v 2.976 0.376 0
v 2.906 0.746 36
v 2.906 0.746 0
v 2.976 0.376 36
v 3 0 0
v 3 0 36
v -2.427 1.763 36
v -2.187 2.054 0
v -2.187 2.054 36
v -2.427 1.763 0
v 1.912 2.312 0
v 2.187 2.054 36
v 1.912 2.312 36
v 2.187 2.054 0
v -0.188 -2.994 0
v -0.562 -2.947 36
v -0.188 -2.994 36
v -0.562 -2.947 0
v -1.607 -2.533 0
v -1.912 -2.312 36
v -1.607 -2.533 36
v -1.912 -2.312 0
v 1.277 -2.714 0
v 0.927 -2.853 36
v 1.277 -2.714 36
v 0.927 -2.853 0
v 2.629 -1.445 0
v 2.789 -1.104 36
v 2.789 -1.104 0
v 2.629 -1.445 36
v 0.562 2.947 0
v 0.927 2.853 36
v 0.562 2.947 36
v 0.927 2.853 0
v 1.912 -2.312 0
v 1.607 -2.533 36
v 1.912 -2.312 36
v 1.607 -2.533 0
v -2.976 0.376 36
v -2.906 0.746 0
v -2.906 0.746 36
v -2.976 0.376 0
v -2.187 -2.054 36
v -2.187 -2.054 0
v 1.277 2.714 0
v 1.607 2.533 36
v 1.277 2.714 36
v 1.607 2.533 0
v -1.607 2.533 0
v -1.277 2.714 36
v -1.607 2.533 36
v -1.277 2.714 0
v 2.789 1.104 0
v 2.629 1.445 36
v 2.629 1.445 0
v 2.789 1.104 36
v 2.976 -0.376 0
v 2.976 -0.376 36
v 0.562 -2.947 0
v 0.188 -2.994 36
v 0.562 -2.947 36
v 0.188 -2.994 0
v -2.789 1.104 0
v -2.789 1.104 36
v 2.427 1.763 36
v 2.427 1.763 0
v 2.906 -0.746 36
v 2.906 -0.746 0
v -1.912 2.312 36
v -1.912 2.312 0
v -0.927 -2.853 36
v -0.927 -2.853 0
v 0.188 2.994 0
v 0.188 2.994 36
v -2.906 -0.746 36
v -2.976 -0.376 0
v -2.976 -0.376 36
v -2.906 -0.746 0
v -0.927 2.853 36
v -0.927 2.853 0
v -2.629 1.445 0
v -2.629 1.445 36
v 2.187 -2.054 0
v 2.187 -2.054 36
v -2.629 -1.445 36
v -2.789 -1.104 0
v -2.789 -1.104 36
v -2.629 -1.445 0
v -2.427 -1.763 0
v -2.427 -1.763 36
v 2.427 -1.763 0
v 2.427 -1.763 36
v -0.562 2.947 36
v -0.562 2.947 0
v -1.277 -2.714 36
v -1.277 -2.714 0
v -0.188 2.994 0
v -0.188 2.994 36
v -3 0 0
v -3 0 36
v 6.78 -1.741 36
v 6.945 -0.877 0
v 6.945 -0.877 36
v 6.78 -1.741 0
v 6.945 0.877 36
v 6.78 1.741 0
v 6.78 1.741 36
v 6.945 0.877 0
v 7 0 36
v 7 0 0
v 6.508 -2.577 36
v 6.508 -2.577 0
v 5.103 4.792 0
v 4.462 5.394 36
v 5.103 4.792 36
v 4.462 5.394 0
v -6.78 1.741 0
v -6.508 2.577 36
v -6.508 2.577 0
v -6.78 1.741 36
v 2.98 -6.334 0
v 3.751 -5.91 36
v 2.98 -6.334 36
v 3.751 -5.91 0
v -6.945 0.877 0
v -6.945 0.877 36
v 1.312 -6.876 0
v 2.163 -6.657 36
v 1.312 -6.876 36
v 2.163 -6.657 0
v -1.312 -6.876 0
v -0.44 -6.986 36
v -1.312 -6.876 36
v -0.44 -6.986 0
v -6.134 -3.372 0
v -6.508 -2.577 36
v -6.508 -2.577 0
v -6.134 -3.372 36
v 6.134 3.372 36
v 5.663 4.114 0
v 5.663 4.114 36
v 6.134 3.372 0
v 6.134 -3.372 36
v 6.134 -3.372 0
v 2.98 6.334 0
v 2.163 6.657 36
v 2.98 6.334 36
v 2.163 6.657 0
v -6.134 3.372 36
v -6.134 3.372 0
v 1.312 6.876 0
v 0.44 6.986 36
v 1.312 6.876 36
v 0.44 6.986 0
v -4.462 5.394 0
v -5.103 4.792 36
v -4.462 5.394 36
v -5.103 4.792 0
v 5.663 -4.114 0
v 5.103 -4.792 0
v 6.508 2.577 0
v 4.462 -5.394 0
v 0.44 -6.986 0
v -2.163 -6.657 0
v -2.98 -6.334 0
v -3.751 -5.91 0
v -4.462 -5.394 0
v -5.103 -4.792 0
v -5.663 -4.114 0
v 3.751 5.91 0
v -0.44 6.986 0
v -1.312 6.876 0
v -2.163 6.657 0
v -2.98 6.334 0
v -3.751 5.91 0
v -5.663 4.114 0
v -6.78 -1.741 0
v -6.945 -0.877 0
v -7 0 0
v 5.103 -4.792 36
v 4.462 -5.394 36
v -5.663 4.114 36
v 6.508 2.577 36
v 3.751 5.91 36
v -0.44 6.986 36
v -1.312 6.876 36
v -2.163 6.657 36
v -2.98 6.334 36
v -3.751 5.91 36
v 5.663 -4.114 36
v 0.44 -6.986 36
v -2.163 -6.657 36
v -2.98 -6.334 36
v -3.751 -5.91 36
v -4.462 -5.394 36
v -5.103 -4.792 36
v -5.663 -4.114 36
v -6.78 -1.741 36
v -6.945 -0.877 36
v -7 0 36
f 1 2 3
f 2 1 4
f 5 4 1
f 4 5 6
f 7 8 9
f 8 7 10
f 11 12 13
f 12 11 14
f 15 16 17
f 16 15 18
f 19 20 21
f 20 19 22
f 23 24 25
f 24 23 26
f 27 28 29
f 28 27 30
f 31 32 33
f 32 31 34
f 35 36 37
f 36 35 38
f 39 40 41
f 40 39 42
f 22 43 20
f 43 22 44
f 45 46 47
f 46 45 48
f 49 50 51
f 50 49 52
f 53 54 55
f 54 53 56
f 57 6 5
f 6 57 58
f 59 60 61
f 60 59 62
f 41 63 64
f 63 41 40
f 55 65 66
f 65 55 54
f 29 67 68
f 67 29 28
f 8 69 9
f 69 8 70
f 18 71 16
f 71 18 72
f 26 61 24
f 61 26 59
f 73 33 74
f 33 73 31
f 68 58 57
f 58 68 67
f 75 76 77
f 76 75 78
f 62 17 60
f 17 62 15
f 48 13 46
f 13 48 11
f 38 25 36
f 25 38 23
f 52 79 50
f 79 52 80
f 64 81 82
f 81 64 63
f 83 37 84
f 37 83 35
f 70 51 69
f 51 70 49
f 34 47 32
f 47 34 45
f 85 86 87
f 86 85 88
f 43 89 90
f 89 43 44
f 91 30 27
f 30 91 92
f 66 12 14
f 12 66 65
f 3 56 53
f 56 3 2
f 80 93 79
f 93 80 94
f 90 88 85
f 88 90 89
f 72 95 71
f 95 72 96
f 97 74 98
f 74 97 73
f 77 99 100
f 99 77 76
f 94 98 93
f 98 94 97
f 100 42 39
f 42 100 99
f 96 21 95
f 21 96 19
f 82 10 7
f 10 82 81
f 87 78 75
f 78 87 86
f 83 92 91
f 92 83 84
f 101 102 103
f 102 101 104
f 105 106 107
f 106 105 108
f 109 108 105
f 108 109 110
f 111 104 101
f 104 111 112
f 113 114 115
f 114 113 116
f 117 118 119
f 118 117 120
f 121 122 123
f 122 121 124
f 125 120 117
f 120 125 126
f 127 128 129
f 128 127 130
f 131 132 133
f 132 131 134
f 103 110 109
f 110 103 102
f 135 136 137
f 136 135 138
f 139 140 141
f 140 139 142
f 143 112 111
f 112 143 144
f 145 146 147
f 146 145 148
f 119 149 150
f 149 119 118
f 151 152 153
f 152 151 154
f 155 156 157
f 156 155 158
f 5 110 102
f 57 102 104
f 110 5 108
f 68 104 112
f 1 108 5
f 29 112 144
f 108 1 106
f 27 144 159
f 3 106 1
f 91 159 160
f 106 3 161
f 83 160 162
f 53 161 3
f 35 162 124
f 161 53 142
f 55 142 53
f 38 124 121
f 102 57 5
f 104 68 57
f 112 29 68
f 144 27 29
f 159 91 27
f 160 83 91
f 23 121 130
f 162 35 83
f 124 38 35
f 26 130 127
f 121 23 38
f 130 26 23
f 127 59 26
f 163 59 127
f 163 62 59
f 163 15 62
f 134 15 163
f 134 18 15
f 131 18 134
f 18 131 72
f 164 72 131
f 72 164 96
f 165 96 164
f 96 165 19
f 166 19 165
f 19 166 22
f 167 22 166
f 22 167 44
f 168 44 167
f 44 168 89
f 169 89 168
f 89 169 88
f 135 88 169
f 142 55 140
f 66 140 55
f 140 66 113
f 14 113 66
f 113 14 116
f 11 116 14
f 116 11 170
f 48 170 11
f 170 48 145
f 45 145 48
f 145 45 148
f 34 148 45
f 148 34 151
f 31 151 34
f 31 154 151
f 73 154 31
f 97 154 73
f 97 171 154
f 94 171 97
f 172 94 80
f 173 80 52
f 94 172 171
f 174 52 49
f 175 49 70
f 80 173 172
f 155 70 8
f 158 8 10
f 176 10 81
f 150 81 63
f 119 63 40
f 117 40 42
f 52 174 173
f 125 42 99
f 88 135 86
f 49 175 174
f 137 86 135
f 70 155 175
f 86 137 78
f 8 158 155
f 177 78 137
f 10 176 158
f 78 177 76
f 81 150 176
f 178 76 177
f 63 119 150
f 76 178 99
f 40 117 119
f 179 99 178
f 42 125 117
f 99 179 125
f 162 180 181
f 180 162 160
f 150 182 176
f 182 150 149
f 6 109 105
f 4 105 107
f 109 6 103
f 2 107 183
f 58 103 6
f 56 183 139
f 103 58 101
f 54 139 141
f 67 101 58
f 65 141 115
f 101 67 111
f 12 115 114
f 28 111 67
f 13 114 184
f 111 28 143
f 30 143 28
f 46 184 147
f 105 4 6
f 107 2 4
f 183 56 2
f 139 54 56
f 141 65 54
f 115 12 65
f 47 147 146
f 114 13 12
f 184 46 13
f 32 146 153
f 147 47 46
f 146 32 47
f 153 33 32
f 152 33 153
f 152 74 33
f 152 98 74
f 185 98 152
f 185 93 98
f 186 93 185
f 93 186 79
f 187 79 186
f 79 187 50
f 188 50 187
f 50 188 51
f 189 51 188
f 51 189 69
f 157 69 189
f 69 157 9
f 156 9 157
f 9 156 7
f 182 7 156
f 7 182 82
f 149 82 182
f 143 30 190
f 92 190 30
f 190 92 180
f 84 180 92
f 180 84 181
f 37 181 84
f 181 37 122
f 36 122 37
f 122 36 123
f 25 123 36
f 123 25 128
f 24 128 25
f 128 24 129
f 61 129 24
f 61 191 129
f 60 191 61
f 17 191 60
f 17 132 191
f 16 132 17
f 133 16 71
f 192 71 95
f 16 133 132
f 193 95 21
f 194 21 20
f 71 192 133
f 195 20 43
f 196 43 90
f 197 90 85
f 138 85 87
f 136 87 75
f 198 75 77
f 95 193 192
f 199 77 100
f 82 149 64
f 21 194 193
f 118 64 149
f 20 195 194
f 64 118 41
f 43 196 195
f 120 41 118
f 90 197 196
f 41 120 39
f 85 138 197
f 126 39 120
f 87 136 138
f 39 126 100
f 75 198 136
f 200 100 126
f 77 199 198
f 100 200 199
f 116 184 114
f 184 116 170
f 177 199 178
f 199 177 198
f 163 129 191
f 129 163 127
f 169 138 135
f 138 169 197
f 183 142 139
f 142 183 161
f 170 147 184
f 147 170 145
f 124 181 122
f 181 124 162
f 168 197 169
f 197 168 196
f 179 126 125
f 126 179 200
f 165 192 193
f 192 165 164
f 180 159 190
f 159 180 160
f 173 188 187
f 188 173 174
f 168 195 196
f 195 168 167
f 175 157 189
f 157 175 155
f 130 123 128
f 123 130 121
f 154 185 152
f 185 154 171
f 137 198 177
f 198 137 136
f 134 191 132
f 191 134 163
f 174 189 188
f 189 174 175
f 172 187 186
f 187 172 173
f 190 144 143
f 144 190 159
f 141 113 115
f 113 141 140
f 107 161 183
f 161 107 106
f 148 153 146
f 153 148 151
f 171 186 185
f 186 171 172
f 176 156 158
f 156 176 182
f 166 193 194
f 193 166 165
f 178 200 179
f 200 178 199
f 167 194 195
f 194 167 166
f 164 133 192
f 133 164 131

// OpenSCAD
$fn = 50;


difference() {
	union() {
		cylinder(h = 36, r = 7.0000000000);
	}
	union() {
		translate(v = [0.0000000000, 0.0000000000, -100.0000000000]) {
			cylinder(h = 200, r = 3.0000000000);
		}
		cylinder(h = 36, r = 1.5000000000);
		cylinder(h = 36, r = 1.5000000000);
		cylinder(h = 36, r = 1.5000000000);
	}
}
